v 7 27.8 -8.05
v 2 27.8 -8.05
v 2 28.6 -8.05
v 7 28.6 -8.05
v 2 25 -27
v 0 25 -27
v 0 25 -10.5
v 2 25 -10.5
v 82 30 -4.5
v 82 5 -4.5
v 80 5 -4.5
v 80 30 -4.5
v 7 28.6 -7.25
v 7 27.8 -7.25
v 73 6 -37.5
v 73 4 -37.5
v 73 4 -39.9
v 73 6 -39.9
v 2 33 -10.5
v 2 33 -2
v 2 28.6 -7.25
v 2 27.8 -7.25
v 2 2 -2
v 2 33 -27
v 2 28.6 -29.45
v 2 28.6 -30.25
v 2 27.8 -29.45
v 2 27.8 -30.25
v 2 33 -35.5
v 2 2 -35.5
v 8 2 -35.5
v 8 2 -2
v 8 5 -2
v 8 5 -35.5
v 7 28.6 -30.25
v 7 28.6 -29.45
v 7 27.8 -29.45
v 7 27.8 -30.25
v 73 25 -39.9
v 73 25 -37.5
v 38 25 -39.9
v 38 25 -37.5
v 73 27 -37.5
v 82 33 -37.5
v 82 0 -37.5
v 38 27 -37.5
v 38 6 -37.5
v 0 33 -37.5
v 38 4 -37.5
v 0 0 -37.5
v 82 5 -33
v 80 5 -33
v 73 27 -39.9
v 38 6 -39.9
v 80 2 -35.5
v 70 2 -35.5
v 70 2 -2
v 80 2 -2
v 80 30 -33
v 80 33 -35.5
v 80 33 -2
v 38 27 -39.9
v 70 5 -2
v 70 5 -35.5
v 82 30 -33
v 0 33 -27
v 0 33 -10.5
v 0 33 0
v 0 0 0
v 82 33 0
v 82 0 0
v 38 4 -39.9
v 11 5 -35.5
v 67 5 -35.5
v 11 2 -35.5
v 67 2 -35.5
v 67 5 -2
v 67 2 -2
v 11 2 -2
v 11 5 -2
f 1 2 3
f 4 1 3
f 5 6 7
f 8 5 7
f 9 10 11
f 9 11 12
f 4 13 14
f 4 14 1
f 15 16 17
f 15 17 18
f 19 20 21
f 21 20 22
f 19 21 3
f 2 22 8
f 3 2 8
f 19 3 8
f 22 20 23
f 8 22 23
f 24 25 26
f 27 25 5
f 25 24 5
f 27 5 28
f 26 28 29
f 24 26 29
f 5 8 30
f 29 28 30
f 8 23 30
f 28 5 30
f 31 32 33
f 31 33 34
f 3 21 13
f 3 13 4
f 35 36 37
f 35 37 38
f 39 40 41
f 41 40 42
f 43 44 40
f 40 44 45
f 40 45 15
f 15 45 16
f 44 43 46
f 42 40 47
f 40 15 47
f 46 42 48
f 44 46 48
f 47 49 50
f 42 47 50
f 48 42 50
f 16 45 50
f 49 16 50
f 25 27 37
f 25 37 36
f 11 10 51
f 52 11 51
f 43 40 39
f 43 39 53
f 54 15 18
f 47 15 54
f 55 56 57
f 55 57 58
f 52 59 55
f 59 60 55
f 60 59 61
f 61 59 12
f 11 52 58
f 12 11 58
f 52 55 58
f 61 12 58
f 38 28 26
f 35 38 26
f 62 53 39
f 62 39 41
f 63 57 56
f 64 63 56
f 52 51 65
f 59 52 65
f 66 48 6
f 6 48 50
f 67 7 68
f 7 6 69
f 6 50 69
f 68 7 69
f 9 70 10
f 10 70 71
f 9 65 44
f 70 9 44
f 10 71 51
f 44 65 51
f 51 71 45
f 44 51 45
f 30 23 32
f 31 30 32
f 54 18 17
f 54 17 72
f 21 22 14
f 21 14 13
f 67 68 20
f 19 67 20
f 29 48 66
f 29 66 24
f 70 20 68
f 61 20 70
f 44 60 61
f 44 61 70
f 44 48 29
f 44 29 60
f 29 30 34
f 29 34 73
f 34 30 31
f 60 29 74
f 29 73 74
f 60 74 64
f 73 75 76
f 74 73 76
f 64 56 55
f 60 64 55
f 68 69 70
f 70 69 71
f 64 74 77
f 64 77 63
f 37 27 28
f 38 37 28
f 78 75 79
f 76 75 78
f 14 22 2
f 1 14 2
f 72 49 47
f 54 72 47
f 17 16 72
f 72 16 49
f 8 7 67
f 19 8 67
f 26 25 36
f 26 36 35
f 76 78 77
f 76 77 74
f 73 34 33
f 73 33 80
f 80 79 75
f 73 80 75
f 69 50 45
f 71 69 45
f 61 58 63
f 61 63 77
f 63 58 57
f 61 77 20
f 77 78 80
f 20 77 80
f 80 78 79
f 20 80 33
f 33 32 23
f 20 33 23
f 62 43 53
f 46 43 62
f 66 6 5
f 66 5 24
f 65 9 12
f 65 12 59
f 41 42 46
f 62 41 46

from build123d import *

# Parameters (mm, degrees)
SKETCH1_W           = 82
SKETCH1_H           = 37.5
BOSS_EXTRUDE2_DEPTH = 2
SKETCH2_W           = 3
SKETCH2_H           = 37.5
BOSS_EXTRUDE4_DEPTH = 3
BOSS_EXTRUDE5_DEPTH = 31
SKETCH6_W           = 16.5
SKETCH6_H           = 8
CUT_EXTRUDE1_DEPTH  = 2
SKETCH7_W           = 28.5
SKETCH7_H           = 25
CUT_EXTRUDE2_DEPTH  = 2
SKETCH8_W           = 0.8
SKETCH8_H           = 0.8
BOSS_EXTRUDE6_DEPTH = 5
SKETCH9_W           = 35
SKETCH9_H           = 2
BOSS_EXTRUDE7_DEPTH = 2.4


with BuildPart() as part:
    # Sketch1 → Boss-Extrude2 (new body)
    with BuildSketch(Plane(origin=(0, 0, 0), x_dir=(1, 0, 0), z_dir=(0, 1, 0))):
        with Locations((41, 18.75)):
            Rectangle(SKETCH1_W, SKETCH1_H)
    extrude(amount=BOSS_EXTRUDE2_DEPTH)

    # Sketch2 → Boss-Extrude4 (add)
    with BuildSketch(Plane(origin=(0, 2, 0), x_dir=(1, 0, 0), z_dir=(0, 1, 0))):
        with Locations((9.5, 18.75)):
            Rectangle(SKETCH2_W, SKETCH2_H)
        with Locations((68.5, 18.75)):
            Rectangle(SKETCH2_W, SKETCH2_H)
    extrude(amount=BOSS_EXTRUDE4_DEPTH)

    # Sketch4 → Boss-Extrude5 (add)
    with BuildSketch(Plane(origin=(0, 2, 0), x_dir=(1, 0, 0), z_dir=(0, 1, 0))):
        Polygon((11, 37.5), (8, 37.5), (0, 37.5), (0, 0), (8, 0), (11, 0), (67, 0), (70, 0), (82, 0), (82, 37.5), (70, 37.5), (67, 37.5), align=None)
        Polygon((2, 2), (2, 35.5), (8, 35.5), (11, 35.5), (67, 35.5), (70, 35.5), (80, 35.5), (80, 2), (70, 2), (67, 2), (11, 2), (8, 2), align=None, mode=Mode.SUBTRACT)
    extrude(amount=BOSS_EXTRUDE5_DEPTH)

    # Sketch6 → Cut-Extrude1 (cut)
    with BuildSketch(Plane.ZY):
        with Locations((-18.75, 29)):
            Rectangle(SKETCH6_W, SKETCH6_H)
    extrude(amount=-CUT_EXTRUDE1_DEPTH, mode=Mode.SUBTRACT)

    # Sketch7 → Cut-Extrude2 (cut)
    with BuildSketch(Plane(origin=(82, 0, 0), x_dir=(0, 0, -1), z_dir=(1, 0, 0))):
        with Locations((18.75, 17.5)):
            Rectangle(SKETCH7_W, SKETCH7_H)
    extrude(amount=-CUT_EXTRUDE2_DEPTH, mode=Mode.SUBTRACT)

    # Sketch8 → Boss-Extrude6 (add)
    with BuildSketch(Plane(origin=(2, 0, 0), x_dir=(0, 0, -1), z_dir=(1, 0, 0))):
        with Locations((7.65, 28.2)):
            Rectangle(SKETCH8_W, SKETCH8_H)
        with Locations((29.85, 28.2)):
            Rectangle(SKETCH8_W, SKETCH8_H)
    extrude(amount=BOSS_EXTRUDE6_DEPTH)

    # Sketch9 → Boss-Extrude7 (add)
    with BuildSketch(Plane(origin=(0, 0, -37.5), x_dir=(-1, 0, 0), z_dir=(0, 0, -1))):
        with Locations((-55.5, 26)):
            Rectangle(SKETCH9_W, SKETCH9_H)
        with Locations((-55.5, 5)):
            Rectangle(SKETCH9_W, SKETCH9_H)
    extrude(amount=BOSS_EXTRUDE7_DEPTH)


solid = part.part
